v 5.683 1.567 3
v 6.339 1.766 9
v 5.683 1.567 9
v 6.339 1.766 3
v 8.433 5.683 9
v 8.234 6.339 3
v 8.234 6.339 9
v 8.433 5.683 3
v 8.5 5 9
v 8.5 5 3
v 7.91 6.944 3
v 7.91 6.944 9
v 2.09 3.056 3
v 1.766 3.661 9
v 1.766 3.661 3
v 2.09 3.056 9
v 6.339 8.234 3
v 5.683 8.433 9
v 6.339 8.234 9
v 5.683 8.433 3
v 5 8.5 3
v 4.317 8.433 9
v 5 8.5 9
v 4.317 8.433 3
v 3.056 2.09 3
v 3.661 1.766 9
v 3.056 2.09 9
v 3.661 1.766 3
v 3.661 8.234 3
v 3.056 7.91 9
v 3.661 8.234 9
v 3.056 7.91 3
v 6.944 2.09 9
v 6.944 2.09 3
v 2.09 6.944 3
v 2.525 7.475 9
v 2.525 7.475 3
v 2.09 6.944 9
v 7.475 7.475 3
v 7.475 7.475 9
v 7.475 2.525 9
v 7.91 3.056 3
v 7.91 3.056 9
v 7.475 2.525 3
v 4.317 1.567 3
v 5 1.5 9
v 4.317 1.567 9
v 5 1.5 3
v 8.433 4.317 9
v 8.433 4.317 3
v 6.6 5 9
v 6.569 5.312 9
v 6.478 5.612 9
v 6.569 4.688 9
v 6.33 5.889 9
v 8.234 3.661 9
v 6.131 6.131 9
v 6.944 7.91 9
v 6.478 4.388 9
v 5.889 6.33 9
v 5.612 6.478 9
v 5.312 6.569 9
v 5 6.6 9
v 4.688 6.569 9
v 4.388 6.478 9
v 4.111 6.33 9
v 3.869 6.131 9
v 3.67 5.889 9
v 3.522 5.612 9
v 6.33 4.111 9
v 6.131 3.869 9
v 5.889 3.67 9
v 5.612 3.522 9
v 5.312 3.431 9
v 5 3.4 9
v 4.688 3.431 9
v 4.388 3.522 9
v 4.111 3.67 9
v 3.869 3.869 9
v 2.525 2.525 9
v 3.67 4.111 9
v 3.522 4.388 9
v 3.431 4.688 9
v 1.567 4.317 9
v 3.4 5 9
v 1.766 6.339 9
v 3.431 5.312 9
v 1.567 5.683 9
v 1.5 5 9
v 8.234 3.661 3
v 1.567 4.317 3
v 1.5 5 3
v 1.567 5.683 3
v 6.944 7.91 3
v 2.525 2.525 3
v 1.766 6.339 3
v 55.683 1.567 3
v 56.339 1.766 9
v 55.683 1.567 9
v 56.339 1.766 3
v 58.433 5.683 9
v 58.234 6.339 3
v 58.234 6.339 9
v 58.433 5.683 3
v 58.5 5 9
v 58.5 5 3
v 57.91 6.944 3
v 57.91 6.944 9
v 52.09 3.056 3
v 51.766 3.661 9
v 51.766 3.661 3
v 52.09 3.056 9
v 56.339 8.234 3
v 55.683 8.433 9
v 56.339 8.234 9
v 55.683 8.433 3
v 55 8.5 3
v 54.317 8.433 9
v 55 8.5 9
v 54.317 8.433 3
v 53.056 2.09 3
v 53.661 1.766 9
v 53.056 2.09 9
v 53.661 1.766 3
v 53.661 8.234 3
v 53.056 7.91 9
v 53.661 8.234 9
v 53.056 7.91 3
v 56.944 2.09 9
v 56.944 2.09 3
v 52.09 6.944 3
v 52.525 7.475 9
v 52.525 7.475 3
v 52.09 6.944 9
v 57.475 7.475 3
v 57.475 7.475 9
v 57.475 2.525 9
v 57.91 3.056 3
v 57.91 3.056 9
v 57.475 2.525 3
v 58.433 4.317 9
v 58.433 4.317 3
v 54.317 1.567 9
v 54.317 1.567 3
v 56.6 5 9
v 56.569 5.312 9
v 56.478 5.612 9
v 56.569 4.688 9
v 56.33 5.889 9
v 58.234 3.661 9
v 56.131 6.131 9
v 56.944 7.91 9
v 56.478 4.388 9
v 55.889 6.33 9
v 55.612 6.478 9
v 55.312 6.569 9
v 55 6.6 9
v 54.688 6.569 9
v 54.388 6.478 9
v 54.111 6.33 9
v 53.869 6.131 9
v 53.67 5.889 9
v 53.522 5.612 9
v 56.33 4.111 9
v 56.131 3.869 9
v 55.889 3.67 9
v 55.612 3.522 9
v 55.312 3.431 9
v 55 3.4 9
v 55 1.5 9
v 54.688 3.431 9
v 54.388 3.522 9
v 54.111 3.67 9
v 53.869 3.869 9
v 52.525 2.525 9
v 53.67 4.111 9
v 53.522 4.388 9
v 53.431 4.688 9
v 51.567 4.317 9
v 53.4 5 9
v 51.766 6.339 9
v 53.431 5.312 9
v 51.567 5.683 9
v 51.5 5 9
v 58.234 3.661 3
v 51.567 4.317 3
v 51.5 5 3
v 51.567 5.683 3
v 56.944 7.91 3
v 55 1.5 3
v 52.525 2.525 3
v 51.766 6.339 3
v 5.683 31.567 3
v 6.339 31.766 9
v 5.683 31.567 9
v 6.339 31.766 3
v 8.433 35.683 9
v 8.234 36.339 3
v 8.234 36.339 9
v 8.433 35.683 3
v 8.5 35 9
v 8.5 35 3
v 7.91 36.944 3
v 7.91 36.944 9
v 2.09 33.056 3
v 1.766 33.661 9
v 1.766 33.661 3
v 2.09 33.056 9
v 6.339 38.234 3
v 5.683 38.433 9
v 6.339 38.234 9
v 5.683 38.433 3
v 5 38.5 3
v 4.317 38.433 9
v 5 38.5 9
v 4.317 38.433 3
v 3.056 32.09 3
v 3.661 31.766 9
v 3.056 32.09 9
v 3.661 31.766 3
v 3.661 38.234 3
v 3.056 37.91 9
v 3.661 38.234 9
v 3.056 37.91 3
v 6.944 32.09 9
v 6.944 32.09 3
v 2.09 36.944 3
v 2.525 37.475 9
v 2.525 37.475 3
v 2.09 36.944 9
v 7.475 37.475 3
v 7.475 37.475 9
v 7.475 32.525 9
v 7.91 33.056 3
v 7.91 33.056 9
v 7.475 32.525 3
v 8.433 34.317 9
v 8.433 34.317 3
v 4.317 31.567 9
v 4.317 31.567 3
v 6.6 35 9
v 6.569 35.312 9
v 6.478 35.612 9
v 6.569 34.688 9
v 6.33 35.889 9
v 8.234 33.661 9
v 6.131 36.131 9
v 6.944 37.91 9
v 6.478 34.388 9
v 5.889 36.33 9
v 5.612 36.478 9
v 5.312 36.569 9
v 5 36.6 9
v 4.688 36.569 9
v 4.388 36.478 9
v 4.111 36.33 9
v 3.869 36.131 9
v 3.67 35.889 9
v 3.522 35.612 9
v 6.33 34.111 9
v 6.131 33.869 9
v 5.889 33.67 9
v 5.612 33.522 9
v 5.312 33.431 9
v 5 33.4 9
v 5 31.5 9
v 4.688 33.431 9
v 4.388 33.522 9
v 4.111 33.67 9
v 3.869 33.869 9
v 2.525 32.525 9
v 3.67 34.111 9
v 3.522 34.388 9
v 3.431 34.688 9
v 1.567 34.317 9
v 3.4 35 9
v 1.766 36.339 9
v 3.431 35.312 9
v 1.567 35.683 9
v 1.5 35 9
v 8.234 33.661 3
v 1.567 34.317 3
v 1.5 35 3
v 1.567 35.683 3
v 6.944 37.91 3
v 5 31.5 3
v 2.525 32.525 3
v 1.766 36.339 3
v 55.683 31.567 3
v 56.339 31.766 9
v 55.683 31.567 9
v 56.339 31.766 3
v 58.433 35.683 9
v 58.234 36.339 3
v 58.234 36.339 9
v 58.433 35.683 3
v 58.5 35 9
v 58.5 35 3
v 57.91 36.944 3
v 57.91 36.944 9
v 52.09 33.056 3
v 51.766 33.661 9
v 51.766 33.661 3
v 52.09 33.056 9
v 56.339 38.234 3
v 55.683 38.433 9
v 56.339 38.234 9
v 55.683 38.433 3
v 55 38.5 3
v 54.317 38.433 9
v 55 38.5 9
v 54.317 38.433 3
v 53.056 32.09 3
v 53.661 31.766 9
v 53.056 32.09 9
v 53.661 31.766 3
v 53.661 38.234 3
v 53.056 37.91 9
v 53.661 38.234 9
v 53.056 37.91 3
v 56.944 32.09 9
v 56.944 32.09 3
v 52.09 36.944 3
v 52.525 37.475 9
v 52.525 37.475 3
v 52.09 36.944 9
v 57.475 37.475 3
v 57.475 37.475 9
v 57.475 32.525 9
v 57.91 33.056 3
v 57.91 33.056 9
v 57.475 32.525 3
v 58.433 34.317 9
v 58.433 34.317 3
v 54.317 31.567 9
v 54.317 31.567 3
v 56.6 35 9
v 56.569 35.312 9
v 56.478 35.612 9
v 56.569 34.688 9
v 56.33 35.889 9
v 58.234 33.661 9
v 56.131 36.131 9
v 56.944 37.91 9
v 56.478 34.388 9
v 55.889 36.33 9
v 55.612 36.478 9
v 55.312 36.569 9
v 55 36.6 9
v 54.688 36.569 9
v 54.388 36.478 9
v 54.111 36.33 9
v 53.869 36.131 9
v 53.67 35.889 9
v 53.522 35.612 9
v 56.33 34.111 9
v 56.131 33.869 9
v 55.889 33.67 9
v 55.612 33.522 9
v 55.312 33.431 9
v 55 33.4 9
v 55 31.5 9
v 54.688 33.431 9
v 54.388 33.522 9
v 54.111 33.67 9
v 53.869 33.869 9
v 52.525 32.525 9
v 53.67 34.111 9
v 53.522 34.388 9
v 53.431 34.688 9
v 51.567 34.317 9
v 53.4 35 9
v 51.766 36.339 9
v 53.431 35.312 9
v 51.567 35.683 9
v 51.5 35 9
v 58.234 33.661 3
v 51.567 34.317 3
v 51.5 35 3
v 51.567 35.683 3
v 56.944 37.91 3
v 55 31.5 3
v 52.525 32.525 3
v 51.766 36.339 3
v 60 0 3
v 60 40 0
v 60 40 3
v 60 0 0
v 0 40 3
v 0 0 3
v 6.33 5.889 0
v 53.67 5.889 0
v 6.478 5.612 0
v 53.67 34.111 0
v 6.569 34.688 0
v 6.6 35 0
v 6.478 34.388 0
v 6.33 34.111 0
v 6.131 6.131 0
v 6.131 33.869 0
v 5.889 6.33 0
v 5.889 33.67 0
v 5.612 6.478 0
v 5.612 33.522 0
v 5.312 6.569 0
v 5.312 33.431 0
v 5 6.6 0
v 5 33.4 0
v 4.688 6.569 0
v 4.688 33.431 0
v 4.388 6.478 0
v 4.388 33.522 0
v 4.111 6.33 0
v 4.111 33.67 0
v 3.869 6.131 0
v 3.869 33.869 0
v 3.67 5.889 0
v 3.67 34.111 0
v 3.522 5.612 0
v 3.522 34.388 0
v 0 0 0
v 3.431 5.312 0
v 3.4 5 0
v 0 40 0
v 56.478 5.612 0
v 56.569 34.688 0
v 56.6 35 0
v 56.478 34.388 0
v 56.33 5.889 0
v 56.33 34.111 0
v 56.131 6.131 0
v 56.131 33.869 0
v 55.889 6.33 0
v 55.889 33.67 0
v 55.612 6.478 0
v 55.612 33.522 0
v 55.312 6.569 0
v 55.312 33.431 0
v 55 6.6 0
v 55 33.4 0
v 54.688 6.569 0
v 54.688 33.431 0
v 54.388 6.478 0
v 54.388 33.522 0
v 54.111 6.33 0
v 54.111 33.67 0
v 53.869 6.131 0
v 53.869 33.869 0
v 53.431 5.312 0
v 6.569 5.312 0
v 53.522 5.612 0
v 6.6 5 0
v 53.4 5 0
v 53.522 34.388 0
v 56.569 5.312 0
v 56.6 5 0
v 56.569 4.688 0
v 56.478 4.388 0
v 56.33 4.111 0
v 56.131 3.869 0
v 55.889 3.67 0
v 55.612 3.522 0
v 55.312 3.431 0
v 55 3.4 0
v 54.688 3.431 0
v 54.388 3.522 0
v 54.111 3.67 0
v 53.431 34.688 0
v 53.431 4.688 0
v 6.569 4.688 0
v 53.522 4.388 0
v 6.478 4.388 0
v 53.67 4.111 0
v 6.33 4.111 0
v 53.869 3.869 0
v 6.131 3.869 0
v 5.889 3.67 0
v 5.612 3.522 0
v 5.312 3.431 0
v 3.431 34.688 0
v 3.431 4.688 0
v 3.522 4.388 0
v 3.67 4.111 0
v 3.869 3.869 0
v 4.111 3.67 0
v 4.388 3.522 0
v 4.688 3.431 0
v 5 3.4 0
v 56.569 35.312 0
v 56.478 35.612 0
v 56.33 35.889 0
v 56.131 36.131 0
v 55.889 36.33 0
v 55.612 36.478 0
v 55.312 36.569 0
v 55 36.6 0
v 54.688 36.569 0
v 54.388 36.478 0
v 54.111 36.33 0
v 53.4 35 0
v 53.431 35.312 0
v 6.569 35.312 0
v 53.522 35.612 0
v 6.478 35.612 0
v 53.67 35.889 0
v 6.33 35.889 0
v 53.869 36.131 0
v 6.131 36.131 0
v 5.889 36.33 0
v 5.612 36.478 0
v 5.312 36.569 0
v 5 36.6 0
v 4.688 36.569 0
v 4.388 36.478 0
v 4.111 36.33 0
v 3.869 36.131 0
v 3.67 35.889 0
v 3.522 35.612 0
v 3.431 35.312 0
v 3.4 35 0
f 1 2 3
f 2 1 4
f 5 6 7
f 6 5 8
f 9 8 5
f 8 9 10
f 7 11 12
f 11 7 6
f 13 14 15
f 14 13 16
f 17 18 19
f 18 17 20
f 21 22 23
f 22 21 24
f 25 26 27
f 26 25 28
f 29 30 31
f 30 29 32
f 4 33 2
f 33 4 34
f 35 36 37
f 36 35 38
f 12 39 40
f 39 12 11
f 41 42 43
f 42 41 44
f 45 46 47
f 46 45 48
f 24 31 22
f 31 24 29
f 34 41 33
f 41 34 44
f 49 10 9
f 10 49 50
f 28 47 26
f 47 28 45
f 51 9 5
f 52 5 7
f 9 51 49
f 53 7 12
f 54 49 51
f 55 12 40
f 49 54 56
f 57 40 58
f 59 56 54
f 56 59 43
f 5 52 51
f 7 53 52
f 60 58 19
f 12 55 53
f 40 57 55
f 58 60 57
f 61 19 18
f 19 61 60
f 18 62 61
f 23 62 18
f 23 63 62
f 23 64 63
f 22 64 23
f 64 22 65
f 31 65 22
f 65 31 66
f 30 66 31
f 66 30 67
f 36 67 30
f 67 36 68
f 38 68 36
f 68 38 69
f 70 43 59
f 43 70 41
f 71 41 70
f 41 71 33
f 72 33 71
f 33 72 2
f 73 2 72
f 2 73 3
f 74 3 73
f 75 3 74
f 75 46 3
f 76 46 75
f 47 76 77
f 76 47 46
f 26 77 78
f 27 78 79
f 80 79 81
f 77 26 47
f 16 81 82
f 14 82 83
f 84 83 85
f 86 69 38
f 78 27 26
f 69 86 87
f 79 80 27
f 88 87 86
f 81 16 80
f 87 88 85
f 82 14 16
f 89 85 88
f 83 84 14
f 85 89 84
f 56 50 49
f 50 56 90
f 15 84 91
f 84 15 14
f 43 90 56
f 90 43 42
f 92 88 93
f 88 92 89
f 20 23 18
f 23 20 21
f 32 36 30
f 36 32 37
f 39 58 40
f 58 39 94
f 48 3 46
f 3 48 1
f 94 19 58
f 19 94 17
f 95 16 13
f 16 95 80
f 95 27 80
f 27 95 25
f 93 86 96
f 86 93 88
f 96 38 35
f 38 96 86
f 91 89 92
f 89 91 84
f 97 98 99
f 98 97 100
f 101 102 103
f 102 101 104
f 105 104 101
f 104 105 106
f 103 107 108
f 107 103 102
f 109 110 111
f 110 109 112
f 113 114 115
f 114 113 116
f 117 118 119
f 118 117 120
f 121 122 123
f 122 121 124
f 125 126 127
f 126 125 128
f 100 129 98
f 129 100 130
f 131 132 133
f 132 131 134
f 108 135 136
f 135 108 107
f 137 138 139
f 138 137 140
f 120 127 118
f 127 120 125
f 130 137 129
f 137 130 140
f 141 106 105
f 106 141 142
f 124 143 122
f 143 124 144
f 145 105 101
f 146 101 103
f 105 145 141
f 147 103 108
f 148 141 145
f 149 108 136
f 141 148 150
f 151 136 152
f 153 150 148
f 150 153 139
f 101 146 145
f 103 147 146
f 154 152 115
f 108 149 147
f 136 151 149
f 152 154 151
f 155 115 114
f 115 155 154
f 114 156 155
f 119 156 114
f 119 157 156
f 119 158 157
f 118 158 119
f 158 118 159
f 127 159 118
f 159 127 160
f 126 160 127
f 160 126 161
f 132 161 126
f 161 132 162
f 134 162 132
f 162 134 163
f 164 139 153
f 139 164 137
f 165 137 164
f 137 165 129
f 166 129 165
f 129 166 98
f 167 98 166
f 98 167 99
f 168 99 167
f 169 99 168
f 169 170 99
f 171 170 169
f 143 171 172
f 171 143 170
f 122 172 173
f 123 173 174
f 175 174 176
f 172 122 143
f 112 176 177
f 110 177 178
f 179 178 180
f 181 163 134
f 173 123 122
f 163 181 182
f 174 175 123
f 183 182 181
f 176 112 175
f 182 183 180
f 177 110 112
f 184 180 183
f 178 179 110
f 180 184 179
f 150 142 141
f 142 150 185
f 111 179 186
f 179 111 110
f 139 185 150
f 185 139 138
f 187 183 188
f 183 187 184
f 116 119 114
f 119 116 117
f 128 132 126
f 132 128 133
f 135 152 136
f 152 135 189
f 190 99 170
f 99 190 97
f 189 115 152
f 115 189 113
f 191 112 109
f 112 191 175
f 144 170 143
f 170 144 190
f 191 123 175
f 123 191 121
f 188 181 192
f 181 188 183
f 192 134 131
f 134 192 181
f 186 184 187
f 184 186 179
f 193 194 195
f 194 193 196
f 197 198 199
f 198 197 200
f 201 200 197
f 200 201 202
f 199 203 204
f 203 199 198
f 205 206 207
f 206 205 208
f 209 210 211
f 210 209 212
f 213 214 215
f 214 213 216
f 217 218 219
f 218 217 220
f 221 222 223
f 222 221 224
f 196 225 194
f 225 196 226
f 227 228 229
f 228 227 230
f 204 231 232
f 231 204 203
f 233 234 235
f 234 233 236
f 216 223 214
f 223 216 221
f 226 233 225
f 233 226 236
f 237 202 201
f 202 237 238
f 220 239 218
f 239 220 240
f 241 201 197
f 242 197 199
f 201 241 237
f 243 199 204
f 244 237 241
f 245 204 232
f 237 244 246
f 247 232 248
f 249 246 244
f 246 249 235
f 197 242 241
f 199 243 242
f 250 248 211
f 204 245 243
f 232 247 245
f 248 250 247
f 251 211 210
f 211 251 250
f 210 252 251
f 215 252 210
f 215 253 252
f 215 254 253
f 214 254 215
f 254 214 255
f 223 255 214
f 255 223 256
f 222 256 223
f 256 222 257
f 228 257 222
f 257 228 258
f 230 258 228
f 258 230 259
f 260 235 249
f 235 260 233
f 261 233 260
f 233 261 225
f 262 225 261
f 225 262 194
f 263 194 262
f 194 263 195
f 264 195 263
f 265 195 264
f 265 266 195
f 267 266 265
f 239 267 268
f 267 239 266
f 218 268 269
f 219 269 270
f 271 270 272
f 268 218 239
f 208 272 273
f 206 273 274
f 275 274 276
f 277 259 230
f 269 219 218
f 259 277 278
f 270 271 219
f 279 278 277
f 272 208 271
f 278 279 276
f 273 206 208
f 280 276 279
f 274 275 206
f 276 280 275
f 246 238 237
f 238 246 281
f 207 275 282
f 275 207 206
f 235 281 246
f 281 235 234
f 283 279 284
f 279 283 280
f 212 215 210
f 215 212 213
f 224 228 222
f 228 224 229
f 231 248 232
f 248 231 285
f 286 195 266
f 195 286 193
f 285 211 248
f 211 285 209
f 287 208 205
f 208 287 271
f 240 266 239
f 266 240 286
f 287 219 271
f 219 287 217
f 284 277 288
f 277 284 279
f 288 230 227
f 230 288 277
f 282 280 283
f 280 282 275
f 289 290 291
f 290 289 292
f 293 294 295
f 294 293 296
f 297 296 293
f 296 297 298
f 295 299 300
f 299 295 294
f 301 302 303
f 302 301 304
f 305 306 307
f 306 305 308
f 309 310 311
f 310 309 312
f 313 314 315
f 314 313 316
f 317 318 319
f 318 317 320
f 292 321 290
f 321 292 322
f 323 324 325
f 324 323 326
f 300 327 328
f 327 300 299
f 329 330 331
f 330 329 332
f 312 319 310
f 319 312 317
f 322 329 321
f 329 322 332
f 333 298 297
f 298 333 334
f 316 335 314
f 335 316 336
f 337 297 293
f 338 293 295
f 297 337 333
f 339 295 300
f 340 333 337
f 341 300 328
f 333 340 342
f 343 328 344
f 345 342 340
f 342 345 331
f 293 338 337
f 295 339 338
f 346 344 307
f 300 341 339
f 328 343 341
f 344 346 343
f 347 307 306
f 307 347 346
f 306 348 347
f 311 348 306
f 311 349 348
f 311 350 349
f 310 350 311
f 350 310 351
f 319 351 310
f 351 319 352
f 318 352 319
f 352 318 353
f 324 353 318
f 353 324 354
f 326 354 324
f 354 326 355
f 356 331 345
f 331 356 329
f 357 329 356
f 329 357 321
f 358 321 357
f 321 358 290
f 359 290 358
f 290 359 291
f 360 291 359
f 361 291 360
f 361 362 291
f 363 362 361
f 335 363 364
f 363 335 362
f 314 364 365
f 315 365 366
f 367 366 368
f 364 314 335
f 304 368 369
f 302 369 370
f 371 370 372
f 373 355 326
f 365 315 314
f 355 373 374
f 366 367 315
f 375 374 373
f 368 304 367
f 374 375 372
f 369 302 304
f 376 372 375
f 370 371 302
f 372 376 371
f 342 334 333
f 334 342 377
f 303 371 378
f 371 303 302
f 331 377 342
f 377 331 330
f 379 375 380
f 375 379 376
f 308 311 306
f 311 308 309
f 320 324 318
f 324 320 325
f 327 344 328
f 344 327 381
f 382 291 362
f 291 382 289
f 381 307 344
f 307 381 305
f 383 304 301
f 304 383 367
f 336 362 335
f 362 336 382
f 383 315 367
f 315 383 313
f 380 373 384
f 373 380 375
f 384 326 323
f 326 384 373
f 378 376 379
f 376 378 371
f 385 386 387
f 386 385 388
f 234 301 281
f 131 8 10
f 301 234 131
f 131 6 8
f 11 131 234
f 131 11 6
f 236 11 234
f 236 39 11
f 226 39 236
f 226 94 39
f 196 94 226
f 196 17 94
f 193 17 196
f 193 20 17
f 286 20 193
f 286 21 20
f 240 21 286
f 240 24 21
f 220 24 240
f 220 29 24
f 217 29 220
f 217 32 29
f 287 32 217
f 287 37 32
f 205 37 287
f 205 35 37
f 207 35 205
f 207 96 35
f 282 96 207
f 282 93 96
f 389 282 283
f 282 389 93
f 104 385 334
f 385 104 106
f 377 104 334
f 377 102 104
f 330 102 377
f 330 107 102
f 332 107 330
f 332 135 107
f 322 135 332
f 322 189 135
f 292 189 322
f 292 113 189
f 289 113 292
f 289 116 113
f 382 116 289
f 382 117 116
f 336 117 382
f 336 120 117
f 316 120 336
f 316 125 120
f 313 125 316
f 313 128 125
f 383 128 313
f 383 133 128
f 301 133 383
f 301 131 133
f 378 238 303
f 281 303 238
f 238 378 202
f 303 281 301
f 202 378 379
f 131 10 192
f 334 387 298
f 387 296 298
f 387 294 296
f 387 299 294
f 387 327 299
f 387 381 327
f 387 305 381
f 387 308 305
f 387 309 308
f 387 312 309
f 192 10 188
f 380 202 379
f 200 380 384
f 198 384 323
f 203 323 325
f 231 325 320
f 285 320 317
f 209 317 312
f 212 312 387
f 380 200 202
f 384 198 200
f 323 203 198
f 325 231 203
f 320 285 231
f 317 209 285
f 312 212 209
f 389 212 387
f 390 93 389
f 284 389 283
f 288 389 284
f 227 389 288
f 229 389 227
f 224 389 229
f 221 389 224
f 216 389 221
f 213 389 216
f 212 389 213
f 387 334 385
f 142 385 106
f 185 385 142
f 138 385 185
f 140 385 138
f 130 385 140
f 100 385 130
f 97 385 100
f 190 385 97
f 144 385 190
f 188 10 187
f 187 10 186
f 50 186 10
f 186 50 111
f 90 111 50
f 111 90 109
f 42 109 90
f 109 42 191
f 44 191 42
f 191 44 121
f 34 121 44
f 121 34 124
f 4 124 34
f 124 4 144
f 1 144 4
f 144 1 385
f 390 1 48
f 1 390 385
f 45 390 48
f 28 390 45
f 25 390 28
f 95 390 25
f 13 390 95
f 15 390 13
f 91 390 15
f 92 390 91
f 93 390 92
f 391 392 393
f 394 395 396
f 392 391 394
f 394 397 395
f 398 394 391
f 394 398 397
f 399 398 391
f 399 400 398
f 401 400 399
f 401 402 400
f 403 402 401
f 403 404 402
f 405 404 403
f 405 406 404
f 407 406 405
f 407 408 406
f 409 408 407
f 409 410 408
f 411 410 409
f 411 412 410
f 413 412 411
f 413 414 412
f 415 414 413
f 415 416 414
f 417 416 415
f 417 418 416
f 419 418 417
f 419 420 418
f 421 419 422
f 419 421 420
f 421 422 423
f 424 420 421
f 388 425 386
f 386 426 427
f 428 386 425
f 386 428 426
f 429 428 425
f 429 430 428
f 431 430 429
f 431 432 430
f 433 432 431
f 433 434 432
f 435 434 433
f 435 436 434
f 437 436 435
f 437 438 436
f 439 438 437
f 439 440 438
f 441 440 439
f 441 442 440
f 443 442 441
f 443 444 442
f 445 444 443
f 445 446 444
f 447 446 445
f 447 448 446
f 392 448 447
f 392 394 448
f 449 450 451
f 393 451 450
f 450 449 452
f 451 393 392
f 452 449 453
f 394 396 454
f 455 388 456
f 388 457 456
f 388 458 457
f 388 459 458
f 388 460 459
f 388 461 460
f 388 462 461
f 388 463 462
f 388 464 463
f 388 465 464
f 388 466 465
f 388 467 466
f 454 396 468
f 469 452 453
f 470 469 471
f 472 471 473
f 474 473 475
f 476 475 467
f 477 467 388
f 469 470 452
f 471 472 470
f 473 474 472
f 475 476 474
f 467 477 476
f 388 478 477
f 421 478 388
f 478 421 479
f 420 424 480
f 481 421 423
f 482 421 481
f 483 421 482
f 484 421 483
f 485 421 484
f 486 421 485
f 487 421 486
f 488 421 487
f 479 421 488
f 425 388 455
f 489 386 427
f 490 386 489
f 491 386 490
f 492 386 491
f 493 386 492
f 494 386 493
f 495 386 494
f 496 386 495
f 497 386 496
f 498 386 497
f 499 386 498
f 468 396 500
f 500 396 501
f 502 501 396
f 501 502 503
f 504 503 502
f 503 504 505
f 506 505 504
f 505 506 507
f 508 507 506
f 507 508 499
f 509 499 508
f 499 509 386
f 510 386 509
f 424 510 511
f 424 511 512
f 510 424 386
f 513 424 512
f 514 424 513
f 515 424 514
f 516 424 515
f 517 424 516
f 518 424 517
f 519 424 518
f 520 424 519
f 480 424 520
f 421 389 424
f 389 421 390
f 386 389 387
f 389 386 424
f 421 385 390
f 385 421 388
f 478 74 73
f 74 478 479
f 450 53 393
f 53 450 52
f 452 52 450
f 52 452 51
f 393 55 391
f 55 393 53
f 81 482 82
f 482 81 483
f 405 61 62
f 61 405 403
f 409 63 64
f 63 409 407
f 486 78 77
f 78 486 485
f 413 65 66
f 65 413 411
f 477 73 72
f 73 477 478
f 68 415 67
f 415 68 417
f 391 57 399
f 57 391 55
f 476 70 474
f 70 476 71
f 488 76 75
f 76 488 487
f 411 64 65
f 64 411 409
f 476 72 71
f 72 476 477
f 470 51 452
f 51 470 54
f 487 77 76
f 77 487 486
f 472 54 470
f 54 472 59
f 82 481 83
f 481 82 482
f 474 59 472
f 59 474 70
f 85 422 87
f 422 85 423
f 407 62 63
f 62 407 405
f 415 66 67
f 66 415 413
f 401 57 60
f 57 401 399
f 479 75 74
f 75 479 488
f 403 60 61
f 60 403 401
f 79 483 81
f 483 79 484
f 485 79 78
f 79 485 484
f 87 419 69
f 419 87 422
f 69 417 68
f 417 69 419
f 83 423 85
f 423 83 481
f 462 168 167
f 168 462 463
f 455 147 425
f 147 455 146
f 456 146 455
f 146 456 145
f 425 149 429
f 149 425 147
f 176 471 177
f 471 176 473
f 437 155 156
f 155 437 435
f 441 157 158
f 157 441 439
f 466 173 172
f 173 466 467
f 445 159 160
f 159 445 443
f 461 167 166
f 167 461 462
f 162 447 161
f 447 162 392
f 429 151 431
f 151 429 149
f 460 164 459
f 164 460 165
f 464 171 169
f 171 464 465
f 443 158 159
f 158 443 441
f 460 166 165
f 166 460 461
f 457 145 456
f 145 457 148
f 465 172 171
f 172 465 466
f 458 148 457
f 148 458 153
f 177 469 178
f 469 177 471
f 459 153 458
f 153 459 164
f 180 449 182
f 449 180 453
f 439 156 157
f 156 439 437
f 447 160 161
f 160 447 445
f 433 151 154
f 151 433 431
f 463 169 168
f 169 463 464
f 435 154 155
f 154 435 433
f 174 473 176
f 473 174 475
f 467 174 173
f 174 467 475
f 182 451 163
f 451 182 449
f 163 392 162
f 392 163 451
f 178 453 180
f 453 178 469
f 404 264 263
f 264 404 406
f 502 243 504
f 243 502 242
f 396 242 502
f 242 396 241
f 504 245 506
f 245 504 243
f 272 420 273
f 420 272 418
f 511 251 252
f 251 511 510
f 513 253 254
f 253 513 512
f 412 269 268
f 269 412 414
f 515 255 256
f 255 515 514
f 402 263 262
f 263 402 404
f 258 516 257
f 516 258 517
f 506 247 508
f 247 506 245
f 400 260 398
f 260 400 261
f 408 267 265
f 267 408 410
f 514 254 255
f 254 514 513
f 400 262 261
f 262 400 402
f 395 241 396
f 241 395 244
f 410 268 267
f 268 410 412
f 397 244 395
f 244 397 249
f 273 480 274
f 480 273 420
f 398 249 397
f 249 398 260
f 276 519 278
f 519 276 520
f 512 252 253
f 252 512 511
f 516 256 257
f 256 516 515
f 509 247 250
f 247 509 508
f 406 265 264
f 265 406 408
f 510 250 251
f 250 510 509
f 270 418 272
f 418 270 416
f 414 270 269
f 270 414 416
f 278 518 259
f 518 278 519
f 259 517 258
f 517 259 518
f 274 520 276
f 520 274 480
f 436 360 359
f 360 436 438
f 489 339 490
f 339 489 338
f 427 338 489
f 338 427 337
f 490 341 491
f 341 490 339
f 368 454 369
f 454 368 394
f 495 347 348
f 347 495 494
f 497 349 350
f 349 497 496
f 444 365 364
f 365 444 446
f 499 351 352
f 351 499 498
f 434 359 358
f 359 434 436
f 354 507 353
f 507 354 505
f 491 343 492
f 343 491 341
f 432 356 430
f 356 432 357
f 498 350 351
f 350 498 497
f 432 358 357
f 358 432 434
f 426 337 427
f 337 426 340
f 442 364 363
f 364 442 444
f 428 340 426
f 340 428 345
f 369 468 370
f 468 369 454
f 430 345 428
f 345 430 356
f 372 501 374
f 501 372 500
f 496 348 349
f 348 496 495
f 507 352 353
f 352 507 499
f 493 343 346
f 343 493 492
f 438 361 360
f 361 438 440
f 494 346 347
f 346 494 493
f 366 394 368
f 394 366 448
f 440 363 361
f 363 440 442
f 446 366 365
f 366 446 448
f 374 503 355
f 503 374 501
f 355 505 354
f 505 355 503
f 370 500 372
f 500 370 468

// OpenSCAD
// file: params.scad
// Parámetros de la placa soporte (los lee/edita agentcad con el bloque aplicar_params).
ancho = 60;
alto = 40;
espesor = 3;
ventanas = 1;        // 1 = aligerada con ventanas hexagonales, 0 = placa llena
// main file
// Equivalente OpenSCAD de generar_stl.py (documentación; el ejemplo no necesita OpenSCAD para funcionar).
include <params.scad>;
taladros = [[5, 5], [ancho - 5, 5], [5, alto - 5], [ancho - 5, alto - 5]];
module placa() {
  difference() {
    union() {
      cube([ancho, alto, espesor]);
      for (t = taladros) translate([t[0], t[1], espesor - 0.01]) cylinder(r = 3.5, h = 6.01, $fn = 32);
    }
    for (t = taladros) translate([t[0], t[1], -1]) cylinder(r = 1.6, h = espesor + 8, $fn = 32);
    // las ventanas (ventanas == 1) las calcula generar_stl.py: rejilla hexagonal a >= 9 mm de los pilares
  }
}
placa();
